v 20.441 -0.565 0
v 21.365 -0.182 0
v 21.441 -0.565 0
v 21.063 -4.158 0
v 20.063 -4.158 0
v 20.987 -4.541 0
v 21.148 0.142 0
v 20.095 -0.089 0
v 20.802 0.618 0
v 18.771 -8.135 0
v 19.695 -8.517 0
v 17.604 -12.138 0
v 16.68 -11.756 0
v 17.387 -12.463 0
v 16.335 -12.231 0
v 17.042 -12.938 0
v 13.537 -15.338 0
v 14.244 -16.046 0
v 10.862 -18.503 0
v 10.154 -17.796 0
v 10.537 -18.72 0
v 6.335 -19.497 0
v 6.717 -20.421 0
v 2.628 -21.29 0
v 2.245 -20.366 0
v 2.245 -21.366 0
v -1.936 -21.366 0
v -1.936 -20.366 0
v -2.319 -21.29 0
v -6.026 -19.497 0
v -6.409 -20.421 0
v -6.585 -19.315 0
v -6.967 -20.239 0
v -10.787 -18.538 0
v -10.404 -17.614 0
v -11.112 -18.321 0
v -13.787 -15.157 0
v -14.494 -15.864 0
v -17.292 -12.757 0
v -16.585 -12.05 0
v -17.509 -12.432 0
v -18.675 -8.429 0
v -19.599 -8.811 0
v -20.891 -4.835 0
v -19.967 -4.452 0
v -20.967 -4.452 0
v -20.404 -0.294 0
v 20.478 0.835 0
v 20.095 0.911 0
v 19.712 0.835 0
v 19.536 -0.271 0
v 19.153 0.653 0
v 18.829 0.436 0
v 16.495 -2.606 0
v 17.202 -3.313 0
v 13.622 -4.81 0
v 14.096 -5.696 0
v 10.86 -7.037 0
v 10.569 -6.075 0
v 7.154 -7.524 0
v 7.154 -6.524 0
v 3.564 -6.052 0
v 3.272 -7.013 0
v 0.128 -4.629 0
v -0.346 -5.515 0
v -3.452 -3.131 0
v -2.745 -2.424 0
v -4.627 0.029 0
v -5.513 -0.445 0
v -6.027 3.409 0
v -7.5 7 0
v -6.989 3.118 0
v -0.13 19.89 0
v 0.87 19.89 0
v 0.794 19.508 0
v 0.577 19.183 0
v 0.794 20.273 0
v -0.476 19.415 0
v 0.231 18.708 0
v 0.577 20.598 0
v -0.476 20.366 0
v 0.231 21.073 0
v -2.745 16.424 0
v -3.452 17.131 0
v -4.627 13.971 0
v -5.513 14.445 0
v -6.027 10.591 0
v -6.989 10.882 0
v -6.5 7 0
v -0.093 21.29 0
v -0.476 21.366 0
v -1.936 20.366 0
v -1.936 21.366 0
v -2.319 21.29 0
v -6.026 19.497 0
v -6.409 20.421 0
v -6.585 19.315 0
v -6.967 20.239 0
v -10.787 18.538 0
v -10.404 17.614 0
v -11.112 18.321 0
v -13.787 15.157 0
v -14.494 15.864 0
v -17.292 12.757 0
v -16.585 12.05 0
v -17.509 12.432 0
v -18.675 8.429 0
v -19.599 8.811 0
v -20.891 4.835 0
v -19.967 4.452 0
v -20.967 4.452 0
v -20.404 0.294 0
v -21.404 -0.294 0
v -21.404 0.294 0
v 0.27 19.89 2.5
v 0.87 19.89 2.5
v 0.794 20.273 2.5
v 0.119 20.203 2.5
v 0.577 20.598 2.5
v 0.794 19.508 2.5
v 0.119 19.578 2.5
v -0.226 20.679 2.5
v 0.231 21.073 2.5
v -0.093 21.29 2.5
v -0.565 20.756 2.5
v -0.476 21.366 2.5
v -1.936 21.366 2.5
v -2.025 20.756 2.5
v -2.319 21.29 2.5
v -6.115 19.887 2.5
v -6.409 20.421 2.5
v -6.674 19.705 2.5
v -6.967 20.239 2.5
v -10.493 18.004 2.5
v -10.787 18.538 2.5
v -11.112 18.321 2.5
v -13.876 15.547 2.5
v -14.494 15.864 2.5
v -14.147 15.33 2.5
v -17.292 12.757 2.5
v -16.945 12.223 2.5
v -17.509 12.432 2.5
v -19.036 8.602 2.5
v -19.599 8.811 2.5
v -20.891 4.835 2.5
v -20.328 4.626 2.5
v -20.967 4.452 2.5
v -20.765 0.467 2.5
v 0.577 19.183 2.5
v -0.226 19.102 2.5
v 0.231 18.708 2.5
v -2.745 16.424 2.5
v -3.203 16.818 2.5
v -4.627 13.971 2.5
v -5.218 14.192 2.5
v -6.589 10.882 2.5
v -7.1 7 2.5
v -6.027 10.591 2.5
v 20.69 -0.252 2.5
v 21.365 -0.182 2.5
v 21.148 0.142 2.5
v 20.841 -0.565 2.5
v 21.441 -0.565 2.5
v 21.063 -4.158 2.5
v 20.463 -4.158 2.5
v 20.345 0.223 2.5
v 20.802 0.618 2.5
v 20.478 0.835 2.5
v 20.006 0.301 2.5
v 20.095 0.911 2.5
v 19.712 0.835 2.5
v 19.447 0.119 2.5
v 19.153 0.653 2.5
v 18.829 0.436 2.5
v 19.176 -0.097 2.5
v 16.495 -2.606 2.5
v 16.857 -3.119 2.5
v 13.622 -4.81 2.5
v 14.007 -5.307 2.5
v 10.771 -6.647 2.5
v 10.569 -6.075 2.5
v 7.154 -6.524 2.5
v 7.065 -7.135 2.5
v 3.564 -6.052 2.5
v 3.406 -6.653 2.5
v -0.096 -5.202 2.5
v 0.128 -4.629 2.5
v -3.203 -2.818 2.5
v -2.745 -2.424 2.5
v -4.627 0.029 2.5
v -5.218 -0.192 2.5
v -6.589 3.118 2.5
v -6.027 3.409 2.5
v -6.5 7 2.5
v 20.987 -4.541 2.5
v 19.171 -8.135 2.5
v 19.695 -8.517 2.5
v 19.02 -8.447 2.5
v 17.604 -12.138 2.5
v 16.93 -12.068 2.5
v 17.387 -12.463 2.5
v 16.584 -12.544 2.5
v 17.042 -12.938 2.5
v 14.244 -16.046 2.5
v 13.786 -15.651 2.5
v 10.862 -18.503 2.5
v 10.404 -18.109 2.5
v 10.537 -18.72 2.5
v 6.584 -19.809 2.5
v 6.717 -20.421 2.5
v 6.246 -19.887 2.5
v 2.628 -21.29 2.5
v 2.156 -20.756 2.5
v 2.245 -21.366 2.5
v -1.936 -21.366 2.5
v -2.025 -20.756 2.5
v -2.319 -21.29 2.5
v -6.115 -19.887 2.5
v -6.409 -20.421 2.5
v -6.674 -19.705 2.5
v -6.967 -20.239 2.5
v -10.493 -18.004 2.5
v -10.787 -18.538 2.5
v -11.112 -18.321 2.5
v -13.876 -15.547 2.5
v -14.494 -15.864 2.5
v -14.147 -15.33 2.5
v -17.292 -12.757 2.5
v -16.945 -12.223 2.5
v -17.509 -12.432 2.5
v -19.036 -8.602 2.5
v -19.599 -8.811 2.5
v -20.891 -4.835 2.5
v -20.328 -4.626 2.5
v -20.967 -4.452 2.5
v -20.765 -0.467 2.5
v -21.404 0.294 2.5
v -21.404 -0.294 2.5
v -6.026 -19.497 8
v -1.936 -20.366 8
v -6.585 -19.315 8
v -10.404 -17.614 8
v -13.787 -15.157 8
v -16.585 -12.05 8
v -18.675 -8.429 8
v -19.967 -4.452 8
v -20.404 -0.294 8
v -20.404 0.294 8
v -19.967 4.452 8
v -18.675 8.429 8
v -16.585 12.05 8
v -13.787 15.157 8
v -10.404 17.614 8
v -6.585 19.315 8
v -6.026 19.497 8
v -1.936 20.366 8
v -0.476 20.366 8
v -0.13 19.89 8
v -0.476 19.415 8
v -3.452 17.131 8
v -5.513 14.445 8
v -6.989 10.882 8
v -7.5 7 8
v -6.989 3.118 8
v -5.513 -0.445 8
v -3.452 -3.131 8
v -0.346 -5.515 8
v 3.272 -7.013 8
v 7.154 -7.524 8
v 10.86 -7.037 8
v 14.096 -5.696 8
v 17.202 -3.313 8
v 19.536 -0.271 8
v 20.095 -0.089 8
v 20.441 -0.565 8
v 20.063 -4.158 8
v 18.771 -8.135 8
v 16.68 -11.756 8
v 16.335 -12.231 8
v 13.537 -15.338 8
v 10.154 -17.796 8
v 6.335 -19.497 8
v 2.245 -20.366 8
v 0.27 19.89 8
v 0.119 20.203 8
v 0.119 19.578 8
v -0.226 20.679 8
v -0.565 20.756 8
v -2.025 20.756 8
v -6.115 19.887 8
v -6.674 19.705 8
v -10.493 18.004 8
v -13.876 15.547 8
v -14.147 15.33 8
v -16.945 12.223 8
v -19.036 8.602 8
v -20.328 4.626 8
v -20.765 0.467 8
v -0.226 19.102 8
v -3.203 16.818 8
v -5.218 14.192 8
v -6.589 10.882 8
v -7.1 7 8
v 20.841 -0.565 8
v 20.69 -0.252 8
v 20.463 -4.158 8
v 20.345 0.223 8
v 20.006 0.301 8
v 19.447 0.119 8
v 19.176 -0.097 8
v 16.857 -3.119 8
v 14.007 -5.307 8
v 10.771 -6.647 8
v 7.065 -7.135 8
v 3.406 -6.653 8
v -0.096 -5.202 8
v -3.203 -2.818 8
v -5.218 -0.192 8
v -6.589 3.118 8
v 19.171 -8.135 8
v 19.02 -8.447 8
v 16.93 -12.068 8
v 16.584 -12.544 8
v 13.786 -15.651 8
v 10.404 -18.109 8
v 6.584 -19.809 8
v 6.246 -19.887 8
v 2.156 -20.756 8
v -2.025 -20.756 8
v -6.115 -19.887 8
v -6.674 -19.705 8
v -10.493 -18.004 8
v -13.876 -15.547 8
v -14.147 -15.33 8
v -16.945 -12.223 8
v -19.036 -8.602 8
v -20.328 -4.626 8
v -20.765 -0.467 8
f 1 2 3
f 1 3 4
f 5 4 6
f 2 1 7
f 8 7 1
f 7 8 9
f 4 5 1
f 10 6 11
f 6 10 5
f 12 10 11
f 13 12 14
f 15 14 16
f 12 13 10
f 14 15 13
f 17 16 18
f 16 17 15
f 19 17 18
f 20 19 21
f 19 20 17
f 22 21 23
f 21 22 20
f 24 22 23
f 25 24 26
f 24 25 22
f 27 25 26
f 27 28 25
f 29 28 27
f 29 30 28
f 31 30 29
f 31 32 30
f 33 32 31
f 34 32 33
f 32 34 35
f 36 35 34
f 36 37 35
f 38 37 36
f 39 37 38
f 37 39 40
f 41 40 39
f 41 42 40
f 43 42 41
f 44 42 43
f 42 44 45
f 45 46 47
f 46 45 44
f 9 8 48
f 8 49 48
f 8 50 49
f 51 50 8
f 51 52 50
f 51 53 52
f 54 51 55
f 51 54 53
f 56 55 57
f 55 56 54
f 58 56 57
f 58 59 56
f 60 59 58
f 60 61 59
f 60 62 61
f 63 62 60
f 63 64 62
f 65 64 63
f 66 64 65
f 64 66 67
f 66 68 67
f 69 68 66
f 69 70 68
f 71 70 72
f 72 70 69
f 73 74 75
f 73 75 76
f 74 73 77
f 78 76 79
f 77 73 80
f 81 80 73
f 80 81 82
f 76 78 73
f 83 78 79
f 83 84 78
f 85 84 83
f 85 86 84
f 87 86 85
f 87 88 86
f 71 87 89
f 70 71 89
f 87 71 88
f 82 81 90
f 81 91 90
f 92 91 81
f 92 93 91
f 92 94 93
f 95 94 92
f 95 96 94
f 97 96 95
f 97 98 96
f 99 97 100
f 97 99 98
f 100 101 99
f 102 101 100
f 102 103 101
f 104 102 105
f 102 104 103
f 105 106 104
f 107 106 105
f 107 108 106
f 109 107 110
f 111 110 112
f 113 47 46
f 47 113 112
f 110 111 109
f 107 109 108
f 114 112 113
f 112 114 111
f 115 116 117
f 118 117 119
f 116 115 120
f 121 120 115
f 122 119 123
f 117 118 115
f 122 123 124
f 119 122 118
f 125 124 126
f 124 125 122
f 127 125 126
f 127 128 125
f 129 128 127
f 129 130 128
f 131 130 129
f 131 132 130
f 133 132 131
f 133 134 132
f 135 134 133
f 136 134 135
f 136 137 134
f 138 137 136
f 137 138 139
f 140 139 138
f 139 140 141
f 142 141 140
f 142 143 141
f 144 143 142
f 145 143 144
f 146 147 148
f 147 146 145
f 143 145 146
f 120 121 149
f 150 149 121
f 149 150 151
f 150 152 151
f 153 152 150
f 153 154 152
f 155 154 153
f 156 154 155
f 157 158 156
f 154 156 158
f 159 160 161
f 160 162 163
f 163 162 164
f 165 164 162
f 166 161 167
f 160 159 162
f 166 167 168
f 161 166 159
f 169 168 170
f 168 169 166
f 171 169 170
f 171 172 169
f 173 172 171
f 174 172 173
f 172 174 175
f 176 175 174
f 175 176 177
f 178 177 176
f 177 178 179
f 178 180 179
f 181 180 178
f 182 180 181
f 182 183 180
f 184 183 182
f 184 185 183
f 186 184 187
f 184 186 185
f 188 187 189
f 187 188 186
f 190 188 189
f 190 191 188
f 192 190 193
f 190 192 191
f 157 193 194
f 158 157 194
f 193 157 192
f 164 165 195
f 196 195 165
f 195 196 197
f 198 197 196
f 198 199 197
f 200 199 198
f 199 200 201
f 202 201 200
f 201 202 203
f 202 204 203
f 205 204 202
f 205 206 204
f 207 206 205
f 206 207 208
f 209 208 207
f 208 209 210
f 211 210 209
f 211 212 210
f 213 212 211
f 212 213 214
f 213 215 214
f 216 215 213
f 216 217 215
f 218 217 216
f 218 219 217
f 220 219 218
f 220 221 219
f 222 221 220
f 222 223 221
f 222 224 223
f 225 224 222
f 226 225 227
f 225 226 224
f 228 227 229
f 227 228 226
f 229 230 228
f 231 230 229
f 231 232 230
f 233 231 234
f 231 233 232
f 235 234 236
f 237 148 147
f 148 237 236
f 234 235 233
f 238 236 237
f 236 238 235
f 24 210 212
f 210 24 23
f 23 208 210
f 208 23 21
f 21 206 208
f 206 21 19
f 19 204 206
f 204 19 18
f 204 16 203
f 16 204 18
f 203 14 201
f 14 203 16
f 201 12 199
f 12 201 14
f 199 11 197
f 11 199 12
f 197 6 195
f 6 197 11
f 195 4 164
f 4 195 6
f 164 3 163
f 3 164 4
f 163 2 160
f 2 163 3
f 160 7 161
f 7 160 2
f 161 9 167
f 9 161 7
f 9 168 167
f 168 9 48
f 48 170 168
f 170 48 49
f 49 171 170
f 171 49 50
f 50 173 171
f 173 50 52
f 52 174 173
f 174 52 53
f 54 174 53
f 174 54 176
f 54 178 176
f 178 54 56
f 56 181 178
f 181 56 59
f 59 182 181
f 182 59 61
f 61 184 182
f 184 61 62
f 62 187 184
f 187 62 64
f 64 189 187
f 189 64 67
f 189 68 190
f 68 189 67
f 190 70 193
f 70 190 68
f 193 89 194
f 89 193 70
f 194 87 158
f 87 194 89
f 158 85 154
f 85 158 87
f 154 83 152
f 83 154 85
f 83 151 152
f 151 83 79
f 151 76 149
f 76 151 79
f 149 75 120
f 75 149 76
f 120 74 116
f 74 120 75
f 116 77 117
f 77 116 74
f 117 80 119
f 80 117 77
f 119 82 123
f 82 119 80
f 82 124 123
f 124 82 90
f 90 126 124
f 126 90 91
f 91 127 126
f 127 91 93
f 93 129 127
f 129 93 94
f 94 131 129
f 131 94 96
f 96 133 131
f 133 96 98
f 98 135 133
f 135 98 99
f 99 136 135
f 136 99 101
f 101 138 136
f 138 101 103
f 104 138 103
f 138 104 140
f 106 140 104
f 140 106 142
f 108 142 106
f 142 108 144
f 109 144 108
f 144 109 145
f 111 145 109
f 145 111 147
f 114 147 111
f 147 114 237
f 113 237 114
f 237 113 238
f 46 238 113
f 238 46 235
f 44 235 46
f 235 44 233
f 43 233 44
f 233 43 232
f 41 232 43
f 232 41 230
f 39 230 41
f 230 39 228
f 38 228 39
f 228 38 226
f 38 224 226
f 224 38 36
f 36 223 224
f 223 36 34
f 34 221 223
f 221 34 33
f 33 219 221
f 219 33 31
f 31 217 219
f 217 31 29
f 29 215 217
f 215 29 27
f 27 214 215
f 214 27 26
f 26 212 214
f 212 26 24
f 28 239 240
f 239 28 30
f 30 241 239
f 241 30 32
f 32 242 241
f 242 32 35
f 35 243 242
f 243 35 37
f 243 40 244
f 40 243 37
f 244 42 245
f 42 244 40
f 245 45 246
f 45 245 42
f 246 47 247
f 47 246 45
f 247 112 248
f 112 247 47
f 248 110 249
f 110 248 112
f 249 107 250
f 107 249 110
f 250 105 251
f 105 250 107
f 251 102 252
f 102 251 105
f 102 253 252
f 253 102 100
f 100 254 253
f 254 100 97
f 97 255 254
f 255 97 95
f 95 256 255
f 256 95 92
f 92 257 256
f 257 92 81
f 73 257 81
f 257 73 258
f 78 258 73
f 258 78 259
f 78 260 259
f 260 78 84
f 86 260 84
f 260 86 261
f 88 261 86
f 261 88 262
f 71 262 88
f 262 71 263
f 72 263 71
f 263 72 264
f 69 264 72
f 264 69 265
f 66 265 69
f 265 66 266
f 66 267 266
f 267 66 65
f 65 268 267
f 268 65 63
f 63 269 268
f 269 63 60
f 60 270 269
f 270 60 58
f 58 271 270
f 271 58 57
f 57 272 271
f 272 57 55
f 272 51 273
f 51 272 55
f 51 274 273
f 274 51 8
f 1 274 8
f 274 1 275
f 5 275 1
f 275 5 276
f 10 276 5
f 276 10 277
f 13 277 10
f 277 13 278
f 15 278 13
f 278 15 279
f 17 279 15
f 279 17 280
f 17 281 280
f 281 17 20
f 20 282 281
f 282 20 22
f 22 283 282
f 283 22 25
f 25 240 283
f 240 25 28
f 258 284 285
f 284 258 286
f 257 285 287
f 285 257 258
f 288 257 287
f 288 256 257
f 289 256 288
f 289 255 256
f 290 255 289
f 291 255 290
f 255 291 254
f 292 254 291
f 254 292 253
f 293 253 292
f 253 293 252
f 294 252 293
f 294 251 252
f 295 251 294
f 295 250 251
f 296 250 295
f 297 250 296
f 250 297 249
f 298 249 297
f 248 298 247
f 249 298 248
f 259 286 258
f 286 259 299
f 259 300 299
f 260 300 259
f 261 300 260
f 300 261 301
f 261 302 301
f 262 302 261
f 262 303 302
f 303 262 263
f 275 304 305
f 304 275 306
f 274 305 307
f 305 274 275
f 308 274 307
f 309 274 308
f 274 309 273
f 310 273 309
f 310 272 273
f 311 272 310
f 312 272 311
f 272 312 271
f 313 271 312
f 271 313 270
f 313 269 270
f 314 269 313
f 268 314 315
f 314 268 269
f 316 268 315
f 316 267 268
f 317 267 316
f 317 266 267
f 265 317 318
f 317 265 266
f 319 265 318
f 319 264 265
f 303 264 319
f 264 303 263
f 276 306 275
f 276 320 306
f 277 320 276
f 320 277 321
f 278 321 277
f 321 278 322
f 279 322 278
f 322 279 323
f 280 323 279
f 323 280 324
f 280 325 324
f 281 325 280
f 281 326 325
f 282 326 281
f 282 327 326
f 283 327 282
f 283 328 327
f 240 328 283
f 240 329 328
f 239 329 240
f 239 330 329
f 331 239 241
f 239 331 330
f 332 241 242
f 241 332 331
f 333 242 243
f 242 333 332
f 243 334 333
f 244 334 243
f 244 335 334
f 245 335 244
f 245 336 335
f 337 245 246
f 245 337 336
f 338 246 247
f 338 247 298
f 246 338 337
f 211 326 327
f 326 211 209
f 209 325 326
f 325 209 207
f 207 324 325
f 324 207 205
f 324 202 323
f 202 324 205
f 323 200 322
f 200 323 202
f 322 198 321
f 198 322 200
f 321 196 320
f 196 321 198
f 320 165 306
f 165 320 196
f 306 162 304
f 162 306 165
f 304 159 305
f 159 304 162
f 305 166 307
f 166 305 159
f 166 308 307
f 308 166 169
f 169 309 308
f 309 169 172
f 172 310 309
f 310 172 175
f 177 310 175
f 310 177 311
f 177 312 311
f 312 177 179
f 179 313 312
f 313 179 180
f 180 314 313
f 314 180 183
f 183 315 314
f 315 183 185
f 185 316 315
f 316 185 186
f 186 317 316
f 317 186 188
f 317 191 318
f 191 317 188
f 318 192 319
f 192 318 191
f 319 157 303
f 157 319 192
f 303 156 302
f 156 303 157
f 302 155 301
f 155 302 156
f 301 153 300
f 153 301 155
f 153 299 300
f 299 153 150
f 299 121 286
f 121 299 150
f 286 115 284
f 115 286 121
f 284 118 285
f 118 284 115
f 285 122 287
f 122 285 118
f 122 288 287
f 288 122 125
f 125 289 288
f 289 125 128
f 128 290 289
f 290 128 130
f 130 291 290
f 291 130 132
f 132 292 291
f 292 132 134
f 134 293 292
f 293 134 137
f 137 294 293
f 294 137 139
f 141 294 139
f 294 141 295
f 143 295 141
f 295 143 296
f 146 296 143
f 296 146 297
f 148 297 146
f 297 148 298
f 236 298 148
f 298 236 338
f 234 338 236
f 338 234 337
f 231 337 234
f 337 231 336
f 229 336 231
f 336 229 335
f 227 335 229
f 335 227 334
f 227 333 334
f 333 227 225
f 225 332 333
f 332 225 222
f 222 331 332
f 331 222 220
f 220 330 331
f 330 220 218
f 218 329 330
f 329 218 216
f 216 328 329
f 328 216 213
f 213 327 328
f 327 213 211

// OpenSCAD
// file: Common.scad
module offset_shell(thickness = 0.1) {
  render() {
      difference() {
          minkowski() {
            children();
            circle(2* thickness, center=true);
          }
        children();
      }
   }
}

module cookie_cutter(handle_thickness=2.5, cutter_tickness=1, total_height=10) {
    union() {
        linear_extrude(height = total_height*(0.25), slices = 60) {
            scale([.2,.2,1]) {
              offset_shell(handle_thickness) {
                children();

              }
            }
        };
        linear_extrude(height = total_height*(0.8), slices = 60)
            translate([0,0,2])
            scale([.2,.2,1]) {
              offset_shell(cutter_tickness) {
                children();
            }
        };
    }
}

module rod_with_clipped_circle(square_d, circle_d, circle_placement) {
    difference() {
        square(square_d, center=true);
        translate(circle_placement) circle(circle_d, center=true);
    }
}

//module cookie_press(handle_thickness=2.5, cutter_tickness=1, total_height=10) {
//    union() {
//        cookie_cutter(handle_thickness, cutter_tickness, total_height);
//        translate([0,0,10]) children();
//    }
//}
//
//
// file: ../ComplexShapes.scad
include <BasicShapes.scad>

module HalfCylinder(r, h, e=1, center=false) {
    translate([0,0, center ? -h/2 : 0])difference(){
        cylinder(h,r,r);
        translate([0,-r,-e])cube([2*r,2*r,h+2*e]);
    }
}

module HalfCircle(r) {
    difference(){
        circle(r);
        translate([-r,-2*r,0]) square(2*r);
    }
}

module Crescent(r, fatten_scale=1, curve_angle=0, rotate=0) {
    r_prime = r / fatten_scale;
    rotate([0,0,rotate]) difference() {
        circle(r_prime*1.1);
        translate([r_prime/4, curve_angle*r_prime/4, 0]) circle(r_prime*fatten_scale);
    }
}


module round_edges(r) {
    minkowski() {
        children();
        circle(r);
    };
}

module CrescentV2(outer_r, inner_r, r_shift, edge_rounding=2) {
    // Different way to construct ... rounded edges ...
   round_edges(edge_rounding) {
        difference() {
            circle(outer_r);
            translate(r_shift) circle(inner_r);
        };
    };
}


//module Arch(x,y,r) {
//    // http://kitwallace.co.uk/Blog/item/2013-01-28T17:59:00Z
//    union() {
//        intersection() {
//           translate([x,y,0]) circle(r);
//           translate([-x,y,0]) circle(r);
//        }
//        translate([0,y/2,0]) square(size=[2 * (r-x), y], center=true);
//    }
//}

module Arch(width, arc_height, strech_height=0) {
    // http://kitwallace.co.uk/Blog/item/2013-01-28T17:59:00Z
    r = arc_height;
    x = (width / 2) - r;
    y = arc_height + strech_height;
    union() {
        intersection() {
           translate([x,y,0]) circle(r);
           translate([-x,y,0]) circle(r);
        }
        translate([0,y/2,0]) square(size=[width, y], center=true);
    }
}
// file: ../BasicShapes.scad
module Star(points, outer, inner_defaulted=0) {
    inner = inner_defaulted == 0 ? 2 * outer  : inner_defaulted;
	// polar to cartesian: radius/angle to x/y
	function x(r, a) = r * cos(a);
	function y(r, a) = r * sin(a);
	
	// angular width of each pie slice of the star
	increment = 360/points;
	
	union() {
		for (p = [0 : points-1]) {
			
			// outer is outer point p
			// inner is inner point following p
			// next is next outer point following p

			assign(	
                x_outer = x(outer, increment * p),
                y_outer = y(outer, increment * p),
                x_inner = x(inner, (increment * p) + (increment/2)),
                y_inner = y(inner, (increment * p) + (increment/2)),
                x_next  = x(outer, increment * (p+1)),
                y_next  = y(outer, increment * (p+1))
            ) {
				polygon(
                    points = [
                        [x_outer, y_outer], 
                        [x_inner, y_inner],
                        [x_next, y_next], 
                        [0, 0]
                    ], 
                    paths  = [[0, 1, 2, 3]]
                );
			}
		}
	}
}

//https://github.com/openscad/MCAD/blob/master/shapes.scad
module Hexagon(size) {
  Star(3, size, size);
}

module Octagon(size) {
  Star(4, size, size);
}
// main file
include <../BasicShapes.scad>
include <../ComplexShapes.scad>
include <Common.scad>


module CrescentWithStar() {
    union() {
        CrescentV2(10, 6.5, [3.75,3.75,0], edge_rounding=0.35);
        translate([3.5,3.5]) rotate([0,0,35]) scale([0.825,0.825]) Star(5,4);
    }
}

// Turned out weird because of the floating piece in the middle ...
//cookie_cutter() {
//    CrescentWithStar();
//};

cookie_cutter() {
    scale([10,10]) CrescentV2(10, 7.5, [3.5,3.5,0], edge_rounding=0.25);
}
